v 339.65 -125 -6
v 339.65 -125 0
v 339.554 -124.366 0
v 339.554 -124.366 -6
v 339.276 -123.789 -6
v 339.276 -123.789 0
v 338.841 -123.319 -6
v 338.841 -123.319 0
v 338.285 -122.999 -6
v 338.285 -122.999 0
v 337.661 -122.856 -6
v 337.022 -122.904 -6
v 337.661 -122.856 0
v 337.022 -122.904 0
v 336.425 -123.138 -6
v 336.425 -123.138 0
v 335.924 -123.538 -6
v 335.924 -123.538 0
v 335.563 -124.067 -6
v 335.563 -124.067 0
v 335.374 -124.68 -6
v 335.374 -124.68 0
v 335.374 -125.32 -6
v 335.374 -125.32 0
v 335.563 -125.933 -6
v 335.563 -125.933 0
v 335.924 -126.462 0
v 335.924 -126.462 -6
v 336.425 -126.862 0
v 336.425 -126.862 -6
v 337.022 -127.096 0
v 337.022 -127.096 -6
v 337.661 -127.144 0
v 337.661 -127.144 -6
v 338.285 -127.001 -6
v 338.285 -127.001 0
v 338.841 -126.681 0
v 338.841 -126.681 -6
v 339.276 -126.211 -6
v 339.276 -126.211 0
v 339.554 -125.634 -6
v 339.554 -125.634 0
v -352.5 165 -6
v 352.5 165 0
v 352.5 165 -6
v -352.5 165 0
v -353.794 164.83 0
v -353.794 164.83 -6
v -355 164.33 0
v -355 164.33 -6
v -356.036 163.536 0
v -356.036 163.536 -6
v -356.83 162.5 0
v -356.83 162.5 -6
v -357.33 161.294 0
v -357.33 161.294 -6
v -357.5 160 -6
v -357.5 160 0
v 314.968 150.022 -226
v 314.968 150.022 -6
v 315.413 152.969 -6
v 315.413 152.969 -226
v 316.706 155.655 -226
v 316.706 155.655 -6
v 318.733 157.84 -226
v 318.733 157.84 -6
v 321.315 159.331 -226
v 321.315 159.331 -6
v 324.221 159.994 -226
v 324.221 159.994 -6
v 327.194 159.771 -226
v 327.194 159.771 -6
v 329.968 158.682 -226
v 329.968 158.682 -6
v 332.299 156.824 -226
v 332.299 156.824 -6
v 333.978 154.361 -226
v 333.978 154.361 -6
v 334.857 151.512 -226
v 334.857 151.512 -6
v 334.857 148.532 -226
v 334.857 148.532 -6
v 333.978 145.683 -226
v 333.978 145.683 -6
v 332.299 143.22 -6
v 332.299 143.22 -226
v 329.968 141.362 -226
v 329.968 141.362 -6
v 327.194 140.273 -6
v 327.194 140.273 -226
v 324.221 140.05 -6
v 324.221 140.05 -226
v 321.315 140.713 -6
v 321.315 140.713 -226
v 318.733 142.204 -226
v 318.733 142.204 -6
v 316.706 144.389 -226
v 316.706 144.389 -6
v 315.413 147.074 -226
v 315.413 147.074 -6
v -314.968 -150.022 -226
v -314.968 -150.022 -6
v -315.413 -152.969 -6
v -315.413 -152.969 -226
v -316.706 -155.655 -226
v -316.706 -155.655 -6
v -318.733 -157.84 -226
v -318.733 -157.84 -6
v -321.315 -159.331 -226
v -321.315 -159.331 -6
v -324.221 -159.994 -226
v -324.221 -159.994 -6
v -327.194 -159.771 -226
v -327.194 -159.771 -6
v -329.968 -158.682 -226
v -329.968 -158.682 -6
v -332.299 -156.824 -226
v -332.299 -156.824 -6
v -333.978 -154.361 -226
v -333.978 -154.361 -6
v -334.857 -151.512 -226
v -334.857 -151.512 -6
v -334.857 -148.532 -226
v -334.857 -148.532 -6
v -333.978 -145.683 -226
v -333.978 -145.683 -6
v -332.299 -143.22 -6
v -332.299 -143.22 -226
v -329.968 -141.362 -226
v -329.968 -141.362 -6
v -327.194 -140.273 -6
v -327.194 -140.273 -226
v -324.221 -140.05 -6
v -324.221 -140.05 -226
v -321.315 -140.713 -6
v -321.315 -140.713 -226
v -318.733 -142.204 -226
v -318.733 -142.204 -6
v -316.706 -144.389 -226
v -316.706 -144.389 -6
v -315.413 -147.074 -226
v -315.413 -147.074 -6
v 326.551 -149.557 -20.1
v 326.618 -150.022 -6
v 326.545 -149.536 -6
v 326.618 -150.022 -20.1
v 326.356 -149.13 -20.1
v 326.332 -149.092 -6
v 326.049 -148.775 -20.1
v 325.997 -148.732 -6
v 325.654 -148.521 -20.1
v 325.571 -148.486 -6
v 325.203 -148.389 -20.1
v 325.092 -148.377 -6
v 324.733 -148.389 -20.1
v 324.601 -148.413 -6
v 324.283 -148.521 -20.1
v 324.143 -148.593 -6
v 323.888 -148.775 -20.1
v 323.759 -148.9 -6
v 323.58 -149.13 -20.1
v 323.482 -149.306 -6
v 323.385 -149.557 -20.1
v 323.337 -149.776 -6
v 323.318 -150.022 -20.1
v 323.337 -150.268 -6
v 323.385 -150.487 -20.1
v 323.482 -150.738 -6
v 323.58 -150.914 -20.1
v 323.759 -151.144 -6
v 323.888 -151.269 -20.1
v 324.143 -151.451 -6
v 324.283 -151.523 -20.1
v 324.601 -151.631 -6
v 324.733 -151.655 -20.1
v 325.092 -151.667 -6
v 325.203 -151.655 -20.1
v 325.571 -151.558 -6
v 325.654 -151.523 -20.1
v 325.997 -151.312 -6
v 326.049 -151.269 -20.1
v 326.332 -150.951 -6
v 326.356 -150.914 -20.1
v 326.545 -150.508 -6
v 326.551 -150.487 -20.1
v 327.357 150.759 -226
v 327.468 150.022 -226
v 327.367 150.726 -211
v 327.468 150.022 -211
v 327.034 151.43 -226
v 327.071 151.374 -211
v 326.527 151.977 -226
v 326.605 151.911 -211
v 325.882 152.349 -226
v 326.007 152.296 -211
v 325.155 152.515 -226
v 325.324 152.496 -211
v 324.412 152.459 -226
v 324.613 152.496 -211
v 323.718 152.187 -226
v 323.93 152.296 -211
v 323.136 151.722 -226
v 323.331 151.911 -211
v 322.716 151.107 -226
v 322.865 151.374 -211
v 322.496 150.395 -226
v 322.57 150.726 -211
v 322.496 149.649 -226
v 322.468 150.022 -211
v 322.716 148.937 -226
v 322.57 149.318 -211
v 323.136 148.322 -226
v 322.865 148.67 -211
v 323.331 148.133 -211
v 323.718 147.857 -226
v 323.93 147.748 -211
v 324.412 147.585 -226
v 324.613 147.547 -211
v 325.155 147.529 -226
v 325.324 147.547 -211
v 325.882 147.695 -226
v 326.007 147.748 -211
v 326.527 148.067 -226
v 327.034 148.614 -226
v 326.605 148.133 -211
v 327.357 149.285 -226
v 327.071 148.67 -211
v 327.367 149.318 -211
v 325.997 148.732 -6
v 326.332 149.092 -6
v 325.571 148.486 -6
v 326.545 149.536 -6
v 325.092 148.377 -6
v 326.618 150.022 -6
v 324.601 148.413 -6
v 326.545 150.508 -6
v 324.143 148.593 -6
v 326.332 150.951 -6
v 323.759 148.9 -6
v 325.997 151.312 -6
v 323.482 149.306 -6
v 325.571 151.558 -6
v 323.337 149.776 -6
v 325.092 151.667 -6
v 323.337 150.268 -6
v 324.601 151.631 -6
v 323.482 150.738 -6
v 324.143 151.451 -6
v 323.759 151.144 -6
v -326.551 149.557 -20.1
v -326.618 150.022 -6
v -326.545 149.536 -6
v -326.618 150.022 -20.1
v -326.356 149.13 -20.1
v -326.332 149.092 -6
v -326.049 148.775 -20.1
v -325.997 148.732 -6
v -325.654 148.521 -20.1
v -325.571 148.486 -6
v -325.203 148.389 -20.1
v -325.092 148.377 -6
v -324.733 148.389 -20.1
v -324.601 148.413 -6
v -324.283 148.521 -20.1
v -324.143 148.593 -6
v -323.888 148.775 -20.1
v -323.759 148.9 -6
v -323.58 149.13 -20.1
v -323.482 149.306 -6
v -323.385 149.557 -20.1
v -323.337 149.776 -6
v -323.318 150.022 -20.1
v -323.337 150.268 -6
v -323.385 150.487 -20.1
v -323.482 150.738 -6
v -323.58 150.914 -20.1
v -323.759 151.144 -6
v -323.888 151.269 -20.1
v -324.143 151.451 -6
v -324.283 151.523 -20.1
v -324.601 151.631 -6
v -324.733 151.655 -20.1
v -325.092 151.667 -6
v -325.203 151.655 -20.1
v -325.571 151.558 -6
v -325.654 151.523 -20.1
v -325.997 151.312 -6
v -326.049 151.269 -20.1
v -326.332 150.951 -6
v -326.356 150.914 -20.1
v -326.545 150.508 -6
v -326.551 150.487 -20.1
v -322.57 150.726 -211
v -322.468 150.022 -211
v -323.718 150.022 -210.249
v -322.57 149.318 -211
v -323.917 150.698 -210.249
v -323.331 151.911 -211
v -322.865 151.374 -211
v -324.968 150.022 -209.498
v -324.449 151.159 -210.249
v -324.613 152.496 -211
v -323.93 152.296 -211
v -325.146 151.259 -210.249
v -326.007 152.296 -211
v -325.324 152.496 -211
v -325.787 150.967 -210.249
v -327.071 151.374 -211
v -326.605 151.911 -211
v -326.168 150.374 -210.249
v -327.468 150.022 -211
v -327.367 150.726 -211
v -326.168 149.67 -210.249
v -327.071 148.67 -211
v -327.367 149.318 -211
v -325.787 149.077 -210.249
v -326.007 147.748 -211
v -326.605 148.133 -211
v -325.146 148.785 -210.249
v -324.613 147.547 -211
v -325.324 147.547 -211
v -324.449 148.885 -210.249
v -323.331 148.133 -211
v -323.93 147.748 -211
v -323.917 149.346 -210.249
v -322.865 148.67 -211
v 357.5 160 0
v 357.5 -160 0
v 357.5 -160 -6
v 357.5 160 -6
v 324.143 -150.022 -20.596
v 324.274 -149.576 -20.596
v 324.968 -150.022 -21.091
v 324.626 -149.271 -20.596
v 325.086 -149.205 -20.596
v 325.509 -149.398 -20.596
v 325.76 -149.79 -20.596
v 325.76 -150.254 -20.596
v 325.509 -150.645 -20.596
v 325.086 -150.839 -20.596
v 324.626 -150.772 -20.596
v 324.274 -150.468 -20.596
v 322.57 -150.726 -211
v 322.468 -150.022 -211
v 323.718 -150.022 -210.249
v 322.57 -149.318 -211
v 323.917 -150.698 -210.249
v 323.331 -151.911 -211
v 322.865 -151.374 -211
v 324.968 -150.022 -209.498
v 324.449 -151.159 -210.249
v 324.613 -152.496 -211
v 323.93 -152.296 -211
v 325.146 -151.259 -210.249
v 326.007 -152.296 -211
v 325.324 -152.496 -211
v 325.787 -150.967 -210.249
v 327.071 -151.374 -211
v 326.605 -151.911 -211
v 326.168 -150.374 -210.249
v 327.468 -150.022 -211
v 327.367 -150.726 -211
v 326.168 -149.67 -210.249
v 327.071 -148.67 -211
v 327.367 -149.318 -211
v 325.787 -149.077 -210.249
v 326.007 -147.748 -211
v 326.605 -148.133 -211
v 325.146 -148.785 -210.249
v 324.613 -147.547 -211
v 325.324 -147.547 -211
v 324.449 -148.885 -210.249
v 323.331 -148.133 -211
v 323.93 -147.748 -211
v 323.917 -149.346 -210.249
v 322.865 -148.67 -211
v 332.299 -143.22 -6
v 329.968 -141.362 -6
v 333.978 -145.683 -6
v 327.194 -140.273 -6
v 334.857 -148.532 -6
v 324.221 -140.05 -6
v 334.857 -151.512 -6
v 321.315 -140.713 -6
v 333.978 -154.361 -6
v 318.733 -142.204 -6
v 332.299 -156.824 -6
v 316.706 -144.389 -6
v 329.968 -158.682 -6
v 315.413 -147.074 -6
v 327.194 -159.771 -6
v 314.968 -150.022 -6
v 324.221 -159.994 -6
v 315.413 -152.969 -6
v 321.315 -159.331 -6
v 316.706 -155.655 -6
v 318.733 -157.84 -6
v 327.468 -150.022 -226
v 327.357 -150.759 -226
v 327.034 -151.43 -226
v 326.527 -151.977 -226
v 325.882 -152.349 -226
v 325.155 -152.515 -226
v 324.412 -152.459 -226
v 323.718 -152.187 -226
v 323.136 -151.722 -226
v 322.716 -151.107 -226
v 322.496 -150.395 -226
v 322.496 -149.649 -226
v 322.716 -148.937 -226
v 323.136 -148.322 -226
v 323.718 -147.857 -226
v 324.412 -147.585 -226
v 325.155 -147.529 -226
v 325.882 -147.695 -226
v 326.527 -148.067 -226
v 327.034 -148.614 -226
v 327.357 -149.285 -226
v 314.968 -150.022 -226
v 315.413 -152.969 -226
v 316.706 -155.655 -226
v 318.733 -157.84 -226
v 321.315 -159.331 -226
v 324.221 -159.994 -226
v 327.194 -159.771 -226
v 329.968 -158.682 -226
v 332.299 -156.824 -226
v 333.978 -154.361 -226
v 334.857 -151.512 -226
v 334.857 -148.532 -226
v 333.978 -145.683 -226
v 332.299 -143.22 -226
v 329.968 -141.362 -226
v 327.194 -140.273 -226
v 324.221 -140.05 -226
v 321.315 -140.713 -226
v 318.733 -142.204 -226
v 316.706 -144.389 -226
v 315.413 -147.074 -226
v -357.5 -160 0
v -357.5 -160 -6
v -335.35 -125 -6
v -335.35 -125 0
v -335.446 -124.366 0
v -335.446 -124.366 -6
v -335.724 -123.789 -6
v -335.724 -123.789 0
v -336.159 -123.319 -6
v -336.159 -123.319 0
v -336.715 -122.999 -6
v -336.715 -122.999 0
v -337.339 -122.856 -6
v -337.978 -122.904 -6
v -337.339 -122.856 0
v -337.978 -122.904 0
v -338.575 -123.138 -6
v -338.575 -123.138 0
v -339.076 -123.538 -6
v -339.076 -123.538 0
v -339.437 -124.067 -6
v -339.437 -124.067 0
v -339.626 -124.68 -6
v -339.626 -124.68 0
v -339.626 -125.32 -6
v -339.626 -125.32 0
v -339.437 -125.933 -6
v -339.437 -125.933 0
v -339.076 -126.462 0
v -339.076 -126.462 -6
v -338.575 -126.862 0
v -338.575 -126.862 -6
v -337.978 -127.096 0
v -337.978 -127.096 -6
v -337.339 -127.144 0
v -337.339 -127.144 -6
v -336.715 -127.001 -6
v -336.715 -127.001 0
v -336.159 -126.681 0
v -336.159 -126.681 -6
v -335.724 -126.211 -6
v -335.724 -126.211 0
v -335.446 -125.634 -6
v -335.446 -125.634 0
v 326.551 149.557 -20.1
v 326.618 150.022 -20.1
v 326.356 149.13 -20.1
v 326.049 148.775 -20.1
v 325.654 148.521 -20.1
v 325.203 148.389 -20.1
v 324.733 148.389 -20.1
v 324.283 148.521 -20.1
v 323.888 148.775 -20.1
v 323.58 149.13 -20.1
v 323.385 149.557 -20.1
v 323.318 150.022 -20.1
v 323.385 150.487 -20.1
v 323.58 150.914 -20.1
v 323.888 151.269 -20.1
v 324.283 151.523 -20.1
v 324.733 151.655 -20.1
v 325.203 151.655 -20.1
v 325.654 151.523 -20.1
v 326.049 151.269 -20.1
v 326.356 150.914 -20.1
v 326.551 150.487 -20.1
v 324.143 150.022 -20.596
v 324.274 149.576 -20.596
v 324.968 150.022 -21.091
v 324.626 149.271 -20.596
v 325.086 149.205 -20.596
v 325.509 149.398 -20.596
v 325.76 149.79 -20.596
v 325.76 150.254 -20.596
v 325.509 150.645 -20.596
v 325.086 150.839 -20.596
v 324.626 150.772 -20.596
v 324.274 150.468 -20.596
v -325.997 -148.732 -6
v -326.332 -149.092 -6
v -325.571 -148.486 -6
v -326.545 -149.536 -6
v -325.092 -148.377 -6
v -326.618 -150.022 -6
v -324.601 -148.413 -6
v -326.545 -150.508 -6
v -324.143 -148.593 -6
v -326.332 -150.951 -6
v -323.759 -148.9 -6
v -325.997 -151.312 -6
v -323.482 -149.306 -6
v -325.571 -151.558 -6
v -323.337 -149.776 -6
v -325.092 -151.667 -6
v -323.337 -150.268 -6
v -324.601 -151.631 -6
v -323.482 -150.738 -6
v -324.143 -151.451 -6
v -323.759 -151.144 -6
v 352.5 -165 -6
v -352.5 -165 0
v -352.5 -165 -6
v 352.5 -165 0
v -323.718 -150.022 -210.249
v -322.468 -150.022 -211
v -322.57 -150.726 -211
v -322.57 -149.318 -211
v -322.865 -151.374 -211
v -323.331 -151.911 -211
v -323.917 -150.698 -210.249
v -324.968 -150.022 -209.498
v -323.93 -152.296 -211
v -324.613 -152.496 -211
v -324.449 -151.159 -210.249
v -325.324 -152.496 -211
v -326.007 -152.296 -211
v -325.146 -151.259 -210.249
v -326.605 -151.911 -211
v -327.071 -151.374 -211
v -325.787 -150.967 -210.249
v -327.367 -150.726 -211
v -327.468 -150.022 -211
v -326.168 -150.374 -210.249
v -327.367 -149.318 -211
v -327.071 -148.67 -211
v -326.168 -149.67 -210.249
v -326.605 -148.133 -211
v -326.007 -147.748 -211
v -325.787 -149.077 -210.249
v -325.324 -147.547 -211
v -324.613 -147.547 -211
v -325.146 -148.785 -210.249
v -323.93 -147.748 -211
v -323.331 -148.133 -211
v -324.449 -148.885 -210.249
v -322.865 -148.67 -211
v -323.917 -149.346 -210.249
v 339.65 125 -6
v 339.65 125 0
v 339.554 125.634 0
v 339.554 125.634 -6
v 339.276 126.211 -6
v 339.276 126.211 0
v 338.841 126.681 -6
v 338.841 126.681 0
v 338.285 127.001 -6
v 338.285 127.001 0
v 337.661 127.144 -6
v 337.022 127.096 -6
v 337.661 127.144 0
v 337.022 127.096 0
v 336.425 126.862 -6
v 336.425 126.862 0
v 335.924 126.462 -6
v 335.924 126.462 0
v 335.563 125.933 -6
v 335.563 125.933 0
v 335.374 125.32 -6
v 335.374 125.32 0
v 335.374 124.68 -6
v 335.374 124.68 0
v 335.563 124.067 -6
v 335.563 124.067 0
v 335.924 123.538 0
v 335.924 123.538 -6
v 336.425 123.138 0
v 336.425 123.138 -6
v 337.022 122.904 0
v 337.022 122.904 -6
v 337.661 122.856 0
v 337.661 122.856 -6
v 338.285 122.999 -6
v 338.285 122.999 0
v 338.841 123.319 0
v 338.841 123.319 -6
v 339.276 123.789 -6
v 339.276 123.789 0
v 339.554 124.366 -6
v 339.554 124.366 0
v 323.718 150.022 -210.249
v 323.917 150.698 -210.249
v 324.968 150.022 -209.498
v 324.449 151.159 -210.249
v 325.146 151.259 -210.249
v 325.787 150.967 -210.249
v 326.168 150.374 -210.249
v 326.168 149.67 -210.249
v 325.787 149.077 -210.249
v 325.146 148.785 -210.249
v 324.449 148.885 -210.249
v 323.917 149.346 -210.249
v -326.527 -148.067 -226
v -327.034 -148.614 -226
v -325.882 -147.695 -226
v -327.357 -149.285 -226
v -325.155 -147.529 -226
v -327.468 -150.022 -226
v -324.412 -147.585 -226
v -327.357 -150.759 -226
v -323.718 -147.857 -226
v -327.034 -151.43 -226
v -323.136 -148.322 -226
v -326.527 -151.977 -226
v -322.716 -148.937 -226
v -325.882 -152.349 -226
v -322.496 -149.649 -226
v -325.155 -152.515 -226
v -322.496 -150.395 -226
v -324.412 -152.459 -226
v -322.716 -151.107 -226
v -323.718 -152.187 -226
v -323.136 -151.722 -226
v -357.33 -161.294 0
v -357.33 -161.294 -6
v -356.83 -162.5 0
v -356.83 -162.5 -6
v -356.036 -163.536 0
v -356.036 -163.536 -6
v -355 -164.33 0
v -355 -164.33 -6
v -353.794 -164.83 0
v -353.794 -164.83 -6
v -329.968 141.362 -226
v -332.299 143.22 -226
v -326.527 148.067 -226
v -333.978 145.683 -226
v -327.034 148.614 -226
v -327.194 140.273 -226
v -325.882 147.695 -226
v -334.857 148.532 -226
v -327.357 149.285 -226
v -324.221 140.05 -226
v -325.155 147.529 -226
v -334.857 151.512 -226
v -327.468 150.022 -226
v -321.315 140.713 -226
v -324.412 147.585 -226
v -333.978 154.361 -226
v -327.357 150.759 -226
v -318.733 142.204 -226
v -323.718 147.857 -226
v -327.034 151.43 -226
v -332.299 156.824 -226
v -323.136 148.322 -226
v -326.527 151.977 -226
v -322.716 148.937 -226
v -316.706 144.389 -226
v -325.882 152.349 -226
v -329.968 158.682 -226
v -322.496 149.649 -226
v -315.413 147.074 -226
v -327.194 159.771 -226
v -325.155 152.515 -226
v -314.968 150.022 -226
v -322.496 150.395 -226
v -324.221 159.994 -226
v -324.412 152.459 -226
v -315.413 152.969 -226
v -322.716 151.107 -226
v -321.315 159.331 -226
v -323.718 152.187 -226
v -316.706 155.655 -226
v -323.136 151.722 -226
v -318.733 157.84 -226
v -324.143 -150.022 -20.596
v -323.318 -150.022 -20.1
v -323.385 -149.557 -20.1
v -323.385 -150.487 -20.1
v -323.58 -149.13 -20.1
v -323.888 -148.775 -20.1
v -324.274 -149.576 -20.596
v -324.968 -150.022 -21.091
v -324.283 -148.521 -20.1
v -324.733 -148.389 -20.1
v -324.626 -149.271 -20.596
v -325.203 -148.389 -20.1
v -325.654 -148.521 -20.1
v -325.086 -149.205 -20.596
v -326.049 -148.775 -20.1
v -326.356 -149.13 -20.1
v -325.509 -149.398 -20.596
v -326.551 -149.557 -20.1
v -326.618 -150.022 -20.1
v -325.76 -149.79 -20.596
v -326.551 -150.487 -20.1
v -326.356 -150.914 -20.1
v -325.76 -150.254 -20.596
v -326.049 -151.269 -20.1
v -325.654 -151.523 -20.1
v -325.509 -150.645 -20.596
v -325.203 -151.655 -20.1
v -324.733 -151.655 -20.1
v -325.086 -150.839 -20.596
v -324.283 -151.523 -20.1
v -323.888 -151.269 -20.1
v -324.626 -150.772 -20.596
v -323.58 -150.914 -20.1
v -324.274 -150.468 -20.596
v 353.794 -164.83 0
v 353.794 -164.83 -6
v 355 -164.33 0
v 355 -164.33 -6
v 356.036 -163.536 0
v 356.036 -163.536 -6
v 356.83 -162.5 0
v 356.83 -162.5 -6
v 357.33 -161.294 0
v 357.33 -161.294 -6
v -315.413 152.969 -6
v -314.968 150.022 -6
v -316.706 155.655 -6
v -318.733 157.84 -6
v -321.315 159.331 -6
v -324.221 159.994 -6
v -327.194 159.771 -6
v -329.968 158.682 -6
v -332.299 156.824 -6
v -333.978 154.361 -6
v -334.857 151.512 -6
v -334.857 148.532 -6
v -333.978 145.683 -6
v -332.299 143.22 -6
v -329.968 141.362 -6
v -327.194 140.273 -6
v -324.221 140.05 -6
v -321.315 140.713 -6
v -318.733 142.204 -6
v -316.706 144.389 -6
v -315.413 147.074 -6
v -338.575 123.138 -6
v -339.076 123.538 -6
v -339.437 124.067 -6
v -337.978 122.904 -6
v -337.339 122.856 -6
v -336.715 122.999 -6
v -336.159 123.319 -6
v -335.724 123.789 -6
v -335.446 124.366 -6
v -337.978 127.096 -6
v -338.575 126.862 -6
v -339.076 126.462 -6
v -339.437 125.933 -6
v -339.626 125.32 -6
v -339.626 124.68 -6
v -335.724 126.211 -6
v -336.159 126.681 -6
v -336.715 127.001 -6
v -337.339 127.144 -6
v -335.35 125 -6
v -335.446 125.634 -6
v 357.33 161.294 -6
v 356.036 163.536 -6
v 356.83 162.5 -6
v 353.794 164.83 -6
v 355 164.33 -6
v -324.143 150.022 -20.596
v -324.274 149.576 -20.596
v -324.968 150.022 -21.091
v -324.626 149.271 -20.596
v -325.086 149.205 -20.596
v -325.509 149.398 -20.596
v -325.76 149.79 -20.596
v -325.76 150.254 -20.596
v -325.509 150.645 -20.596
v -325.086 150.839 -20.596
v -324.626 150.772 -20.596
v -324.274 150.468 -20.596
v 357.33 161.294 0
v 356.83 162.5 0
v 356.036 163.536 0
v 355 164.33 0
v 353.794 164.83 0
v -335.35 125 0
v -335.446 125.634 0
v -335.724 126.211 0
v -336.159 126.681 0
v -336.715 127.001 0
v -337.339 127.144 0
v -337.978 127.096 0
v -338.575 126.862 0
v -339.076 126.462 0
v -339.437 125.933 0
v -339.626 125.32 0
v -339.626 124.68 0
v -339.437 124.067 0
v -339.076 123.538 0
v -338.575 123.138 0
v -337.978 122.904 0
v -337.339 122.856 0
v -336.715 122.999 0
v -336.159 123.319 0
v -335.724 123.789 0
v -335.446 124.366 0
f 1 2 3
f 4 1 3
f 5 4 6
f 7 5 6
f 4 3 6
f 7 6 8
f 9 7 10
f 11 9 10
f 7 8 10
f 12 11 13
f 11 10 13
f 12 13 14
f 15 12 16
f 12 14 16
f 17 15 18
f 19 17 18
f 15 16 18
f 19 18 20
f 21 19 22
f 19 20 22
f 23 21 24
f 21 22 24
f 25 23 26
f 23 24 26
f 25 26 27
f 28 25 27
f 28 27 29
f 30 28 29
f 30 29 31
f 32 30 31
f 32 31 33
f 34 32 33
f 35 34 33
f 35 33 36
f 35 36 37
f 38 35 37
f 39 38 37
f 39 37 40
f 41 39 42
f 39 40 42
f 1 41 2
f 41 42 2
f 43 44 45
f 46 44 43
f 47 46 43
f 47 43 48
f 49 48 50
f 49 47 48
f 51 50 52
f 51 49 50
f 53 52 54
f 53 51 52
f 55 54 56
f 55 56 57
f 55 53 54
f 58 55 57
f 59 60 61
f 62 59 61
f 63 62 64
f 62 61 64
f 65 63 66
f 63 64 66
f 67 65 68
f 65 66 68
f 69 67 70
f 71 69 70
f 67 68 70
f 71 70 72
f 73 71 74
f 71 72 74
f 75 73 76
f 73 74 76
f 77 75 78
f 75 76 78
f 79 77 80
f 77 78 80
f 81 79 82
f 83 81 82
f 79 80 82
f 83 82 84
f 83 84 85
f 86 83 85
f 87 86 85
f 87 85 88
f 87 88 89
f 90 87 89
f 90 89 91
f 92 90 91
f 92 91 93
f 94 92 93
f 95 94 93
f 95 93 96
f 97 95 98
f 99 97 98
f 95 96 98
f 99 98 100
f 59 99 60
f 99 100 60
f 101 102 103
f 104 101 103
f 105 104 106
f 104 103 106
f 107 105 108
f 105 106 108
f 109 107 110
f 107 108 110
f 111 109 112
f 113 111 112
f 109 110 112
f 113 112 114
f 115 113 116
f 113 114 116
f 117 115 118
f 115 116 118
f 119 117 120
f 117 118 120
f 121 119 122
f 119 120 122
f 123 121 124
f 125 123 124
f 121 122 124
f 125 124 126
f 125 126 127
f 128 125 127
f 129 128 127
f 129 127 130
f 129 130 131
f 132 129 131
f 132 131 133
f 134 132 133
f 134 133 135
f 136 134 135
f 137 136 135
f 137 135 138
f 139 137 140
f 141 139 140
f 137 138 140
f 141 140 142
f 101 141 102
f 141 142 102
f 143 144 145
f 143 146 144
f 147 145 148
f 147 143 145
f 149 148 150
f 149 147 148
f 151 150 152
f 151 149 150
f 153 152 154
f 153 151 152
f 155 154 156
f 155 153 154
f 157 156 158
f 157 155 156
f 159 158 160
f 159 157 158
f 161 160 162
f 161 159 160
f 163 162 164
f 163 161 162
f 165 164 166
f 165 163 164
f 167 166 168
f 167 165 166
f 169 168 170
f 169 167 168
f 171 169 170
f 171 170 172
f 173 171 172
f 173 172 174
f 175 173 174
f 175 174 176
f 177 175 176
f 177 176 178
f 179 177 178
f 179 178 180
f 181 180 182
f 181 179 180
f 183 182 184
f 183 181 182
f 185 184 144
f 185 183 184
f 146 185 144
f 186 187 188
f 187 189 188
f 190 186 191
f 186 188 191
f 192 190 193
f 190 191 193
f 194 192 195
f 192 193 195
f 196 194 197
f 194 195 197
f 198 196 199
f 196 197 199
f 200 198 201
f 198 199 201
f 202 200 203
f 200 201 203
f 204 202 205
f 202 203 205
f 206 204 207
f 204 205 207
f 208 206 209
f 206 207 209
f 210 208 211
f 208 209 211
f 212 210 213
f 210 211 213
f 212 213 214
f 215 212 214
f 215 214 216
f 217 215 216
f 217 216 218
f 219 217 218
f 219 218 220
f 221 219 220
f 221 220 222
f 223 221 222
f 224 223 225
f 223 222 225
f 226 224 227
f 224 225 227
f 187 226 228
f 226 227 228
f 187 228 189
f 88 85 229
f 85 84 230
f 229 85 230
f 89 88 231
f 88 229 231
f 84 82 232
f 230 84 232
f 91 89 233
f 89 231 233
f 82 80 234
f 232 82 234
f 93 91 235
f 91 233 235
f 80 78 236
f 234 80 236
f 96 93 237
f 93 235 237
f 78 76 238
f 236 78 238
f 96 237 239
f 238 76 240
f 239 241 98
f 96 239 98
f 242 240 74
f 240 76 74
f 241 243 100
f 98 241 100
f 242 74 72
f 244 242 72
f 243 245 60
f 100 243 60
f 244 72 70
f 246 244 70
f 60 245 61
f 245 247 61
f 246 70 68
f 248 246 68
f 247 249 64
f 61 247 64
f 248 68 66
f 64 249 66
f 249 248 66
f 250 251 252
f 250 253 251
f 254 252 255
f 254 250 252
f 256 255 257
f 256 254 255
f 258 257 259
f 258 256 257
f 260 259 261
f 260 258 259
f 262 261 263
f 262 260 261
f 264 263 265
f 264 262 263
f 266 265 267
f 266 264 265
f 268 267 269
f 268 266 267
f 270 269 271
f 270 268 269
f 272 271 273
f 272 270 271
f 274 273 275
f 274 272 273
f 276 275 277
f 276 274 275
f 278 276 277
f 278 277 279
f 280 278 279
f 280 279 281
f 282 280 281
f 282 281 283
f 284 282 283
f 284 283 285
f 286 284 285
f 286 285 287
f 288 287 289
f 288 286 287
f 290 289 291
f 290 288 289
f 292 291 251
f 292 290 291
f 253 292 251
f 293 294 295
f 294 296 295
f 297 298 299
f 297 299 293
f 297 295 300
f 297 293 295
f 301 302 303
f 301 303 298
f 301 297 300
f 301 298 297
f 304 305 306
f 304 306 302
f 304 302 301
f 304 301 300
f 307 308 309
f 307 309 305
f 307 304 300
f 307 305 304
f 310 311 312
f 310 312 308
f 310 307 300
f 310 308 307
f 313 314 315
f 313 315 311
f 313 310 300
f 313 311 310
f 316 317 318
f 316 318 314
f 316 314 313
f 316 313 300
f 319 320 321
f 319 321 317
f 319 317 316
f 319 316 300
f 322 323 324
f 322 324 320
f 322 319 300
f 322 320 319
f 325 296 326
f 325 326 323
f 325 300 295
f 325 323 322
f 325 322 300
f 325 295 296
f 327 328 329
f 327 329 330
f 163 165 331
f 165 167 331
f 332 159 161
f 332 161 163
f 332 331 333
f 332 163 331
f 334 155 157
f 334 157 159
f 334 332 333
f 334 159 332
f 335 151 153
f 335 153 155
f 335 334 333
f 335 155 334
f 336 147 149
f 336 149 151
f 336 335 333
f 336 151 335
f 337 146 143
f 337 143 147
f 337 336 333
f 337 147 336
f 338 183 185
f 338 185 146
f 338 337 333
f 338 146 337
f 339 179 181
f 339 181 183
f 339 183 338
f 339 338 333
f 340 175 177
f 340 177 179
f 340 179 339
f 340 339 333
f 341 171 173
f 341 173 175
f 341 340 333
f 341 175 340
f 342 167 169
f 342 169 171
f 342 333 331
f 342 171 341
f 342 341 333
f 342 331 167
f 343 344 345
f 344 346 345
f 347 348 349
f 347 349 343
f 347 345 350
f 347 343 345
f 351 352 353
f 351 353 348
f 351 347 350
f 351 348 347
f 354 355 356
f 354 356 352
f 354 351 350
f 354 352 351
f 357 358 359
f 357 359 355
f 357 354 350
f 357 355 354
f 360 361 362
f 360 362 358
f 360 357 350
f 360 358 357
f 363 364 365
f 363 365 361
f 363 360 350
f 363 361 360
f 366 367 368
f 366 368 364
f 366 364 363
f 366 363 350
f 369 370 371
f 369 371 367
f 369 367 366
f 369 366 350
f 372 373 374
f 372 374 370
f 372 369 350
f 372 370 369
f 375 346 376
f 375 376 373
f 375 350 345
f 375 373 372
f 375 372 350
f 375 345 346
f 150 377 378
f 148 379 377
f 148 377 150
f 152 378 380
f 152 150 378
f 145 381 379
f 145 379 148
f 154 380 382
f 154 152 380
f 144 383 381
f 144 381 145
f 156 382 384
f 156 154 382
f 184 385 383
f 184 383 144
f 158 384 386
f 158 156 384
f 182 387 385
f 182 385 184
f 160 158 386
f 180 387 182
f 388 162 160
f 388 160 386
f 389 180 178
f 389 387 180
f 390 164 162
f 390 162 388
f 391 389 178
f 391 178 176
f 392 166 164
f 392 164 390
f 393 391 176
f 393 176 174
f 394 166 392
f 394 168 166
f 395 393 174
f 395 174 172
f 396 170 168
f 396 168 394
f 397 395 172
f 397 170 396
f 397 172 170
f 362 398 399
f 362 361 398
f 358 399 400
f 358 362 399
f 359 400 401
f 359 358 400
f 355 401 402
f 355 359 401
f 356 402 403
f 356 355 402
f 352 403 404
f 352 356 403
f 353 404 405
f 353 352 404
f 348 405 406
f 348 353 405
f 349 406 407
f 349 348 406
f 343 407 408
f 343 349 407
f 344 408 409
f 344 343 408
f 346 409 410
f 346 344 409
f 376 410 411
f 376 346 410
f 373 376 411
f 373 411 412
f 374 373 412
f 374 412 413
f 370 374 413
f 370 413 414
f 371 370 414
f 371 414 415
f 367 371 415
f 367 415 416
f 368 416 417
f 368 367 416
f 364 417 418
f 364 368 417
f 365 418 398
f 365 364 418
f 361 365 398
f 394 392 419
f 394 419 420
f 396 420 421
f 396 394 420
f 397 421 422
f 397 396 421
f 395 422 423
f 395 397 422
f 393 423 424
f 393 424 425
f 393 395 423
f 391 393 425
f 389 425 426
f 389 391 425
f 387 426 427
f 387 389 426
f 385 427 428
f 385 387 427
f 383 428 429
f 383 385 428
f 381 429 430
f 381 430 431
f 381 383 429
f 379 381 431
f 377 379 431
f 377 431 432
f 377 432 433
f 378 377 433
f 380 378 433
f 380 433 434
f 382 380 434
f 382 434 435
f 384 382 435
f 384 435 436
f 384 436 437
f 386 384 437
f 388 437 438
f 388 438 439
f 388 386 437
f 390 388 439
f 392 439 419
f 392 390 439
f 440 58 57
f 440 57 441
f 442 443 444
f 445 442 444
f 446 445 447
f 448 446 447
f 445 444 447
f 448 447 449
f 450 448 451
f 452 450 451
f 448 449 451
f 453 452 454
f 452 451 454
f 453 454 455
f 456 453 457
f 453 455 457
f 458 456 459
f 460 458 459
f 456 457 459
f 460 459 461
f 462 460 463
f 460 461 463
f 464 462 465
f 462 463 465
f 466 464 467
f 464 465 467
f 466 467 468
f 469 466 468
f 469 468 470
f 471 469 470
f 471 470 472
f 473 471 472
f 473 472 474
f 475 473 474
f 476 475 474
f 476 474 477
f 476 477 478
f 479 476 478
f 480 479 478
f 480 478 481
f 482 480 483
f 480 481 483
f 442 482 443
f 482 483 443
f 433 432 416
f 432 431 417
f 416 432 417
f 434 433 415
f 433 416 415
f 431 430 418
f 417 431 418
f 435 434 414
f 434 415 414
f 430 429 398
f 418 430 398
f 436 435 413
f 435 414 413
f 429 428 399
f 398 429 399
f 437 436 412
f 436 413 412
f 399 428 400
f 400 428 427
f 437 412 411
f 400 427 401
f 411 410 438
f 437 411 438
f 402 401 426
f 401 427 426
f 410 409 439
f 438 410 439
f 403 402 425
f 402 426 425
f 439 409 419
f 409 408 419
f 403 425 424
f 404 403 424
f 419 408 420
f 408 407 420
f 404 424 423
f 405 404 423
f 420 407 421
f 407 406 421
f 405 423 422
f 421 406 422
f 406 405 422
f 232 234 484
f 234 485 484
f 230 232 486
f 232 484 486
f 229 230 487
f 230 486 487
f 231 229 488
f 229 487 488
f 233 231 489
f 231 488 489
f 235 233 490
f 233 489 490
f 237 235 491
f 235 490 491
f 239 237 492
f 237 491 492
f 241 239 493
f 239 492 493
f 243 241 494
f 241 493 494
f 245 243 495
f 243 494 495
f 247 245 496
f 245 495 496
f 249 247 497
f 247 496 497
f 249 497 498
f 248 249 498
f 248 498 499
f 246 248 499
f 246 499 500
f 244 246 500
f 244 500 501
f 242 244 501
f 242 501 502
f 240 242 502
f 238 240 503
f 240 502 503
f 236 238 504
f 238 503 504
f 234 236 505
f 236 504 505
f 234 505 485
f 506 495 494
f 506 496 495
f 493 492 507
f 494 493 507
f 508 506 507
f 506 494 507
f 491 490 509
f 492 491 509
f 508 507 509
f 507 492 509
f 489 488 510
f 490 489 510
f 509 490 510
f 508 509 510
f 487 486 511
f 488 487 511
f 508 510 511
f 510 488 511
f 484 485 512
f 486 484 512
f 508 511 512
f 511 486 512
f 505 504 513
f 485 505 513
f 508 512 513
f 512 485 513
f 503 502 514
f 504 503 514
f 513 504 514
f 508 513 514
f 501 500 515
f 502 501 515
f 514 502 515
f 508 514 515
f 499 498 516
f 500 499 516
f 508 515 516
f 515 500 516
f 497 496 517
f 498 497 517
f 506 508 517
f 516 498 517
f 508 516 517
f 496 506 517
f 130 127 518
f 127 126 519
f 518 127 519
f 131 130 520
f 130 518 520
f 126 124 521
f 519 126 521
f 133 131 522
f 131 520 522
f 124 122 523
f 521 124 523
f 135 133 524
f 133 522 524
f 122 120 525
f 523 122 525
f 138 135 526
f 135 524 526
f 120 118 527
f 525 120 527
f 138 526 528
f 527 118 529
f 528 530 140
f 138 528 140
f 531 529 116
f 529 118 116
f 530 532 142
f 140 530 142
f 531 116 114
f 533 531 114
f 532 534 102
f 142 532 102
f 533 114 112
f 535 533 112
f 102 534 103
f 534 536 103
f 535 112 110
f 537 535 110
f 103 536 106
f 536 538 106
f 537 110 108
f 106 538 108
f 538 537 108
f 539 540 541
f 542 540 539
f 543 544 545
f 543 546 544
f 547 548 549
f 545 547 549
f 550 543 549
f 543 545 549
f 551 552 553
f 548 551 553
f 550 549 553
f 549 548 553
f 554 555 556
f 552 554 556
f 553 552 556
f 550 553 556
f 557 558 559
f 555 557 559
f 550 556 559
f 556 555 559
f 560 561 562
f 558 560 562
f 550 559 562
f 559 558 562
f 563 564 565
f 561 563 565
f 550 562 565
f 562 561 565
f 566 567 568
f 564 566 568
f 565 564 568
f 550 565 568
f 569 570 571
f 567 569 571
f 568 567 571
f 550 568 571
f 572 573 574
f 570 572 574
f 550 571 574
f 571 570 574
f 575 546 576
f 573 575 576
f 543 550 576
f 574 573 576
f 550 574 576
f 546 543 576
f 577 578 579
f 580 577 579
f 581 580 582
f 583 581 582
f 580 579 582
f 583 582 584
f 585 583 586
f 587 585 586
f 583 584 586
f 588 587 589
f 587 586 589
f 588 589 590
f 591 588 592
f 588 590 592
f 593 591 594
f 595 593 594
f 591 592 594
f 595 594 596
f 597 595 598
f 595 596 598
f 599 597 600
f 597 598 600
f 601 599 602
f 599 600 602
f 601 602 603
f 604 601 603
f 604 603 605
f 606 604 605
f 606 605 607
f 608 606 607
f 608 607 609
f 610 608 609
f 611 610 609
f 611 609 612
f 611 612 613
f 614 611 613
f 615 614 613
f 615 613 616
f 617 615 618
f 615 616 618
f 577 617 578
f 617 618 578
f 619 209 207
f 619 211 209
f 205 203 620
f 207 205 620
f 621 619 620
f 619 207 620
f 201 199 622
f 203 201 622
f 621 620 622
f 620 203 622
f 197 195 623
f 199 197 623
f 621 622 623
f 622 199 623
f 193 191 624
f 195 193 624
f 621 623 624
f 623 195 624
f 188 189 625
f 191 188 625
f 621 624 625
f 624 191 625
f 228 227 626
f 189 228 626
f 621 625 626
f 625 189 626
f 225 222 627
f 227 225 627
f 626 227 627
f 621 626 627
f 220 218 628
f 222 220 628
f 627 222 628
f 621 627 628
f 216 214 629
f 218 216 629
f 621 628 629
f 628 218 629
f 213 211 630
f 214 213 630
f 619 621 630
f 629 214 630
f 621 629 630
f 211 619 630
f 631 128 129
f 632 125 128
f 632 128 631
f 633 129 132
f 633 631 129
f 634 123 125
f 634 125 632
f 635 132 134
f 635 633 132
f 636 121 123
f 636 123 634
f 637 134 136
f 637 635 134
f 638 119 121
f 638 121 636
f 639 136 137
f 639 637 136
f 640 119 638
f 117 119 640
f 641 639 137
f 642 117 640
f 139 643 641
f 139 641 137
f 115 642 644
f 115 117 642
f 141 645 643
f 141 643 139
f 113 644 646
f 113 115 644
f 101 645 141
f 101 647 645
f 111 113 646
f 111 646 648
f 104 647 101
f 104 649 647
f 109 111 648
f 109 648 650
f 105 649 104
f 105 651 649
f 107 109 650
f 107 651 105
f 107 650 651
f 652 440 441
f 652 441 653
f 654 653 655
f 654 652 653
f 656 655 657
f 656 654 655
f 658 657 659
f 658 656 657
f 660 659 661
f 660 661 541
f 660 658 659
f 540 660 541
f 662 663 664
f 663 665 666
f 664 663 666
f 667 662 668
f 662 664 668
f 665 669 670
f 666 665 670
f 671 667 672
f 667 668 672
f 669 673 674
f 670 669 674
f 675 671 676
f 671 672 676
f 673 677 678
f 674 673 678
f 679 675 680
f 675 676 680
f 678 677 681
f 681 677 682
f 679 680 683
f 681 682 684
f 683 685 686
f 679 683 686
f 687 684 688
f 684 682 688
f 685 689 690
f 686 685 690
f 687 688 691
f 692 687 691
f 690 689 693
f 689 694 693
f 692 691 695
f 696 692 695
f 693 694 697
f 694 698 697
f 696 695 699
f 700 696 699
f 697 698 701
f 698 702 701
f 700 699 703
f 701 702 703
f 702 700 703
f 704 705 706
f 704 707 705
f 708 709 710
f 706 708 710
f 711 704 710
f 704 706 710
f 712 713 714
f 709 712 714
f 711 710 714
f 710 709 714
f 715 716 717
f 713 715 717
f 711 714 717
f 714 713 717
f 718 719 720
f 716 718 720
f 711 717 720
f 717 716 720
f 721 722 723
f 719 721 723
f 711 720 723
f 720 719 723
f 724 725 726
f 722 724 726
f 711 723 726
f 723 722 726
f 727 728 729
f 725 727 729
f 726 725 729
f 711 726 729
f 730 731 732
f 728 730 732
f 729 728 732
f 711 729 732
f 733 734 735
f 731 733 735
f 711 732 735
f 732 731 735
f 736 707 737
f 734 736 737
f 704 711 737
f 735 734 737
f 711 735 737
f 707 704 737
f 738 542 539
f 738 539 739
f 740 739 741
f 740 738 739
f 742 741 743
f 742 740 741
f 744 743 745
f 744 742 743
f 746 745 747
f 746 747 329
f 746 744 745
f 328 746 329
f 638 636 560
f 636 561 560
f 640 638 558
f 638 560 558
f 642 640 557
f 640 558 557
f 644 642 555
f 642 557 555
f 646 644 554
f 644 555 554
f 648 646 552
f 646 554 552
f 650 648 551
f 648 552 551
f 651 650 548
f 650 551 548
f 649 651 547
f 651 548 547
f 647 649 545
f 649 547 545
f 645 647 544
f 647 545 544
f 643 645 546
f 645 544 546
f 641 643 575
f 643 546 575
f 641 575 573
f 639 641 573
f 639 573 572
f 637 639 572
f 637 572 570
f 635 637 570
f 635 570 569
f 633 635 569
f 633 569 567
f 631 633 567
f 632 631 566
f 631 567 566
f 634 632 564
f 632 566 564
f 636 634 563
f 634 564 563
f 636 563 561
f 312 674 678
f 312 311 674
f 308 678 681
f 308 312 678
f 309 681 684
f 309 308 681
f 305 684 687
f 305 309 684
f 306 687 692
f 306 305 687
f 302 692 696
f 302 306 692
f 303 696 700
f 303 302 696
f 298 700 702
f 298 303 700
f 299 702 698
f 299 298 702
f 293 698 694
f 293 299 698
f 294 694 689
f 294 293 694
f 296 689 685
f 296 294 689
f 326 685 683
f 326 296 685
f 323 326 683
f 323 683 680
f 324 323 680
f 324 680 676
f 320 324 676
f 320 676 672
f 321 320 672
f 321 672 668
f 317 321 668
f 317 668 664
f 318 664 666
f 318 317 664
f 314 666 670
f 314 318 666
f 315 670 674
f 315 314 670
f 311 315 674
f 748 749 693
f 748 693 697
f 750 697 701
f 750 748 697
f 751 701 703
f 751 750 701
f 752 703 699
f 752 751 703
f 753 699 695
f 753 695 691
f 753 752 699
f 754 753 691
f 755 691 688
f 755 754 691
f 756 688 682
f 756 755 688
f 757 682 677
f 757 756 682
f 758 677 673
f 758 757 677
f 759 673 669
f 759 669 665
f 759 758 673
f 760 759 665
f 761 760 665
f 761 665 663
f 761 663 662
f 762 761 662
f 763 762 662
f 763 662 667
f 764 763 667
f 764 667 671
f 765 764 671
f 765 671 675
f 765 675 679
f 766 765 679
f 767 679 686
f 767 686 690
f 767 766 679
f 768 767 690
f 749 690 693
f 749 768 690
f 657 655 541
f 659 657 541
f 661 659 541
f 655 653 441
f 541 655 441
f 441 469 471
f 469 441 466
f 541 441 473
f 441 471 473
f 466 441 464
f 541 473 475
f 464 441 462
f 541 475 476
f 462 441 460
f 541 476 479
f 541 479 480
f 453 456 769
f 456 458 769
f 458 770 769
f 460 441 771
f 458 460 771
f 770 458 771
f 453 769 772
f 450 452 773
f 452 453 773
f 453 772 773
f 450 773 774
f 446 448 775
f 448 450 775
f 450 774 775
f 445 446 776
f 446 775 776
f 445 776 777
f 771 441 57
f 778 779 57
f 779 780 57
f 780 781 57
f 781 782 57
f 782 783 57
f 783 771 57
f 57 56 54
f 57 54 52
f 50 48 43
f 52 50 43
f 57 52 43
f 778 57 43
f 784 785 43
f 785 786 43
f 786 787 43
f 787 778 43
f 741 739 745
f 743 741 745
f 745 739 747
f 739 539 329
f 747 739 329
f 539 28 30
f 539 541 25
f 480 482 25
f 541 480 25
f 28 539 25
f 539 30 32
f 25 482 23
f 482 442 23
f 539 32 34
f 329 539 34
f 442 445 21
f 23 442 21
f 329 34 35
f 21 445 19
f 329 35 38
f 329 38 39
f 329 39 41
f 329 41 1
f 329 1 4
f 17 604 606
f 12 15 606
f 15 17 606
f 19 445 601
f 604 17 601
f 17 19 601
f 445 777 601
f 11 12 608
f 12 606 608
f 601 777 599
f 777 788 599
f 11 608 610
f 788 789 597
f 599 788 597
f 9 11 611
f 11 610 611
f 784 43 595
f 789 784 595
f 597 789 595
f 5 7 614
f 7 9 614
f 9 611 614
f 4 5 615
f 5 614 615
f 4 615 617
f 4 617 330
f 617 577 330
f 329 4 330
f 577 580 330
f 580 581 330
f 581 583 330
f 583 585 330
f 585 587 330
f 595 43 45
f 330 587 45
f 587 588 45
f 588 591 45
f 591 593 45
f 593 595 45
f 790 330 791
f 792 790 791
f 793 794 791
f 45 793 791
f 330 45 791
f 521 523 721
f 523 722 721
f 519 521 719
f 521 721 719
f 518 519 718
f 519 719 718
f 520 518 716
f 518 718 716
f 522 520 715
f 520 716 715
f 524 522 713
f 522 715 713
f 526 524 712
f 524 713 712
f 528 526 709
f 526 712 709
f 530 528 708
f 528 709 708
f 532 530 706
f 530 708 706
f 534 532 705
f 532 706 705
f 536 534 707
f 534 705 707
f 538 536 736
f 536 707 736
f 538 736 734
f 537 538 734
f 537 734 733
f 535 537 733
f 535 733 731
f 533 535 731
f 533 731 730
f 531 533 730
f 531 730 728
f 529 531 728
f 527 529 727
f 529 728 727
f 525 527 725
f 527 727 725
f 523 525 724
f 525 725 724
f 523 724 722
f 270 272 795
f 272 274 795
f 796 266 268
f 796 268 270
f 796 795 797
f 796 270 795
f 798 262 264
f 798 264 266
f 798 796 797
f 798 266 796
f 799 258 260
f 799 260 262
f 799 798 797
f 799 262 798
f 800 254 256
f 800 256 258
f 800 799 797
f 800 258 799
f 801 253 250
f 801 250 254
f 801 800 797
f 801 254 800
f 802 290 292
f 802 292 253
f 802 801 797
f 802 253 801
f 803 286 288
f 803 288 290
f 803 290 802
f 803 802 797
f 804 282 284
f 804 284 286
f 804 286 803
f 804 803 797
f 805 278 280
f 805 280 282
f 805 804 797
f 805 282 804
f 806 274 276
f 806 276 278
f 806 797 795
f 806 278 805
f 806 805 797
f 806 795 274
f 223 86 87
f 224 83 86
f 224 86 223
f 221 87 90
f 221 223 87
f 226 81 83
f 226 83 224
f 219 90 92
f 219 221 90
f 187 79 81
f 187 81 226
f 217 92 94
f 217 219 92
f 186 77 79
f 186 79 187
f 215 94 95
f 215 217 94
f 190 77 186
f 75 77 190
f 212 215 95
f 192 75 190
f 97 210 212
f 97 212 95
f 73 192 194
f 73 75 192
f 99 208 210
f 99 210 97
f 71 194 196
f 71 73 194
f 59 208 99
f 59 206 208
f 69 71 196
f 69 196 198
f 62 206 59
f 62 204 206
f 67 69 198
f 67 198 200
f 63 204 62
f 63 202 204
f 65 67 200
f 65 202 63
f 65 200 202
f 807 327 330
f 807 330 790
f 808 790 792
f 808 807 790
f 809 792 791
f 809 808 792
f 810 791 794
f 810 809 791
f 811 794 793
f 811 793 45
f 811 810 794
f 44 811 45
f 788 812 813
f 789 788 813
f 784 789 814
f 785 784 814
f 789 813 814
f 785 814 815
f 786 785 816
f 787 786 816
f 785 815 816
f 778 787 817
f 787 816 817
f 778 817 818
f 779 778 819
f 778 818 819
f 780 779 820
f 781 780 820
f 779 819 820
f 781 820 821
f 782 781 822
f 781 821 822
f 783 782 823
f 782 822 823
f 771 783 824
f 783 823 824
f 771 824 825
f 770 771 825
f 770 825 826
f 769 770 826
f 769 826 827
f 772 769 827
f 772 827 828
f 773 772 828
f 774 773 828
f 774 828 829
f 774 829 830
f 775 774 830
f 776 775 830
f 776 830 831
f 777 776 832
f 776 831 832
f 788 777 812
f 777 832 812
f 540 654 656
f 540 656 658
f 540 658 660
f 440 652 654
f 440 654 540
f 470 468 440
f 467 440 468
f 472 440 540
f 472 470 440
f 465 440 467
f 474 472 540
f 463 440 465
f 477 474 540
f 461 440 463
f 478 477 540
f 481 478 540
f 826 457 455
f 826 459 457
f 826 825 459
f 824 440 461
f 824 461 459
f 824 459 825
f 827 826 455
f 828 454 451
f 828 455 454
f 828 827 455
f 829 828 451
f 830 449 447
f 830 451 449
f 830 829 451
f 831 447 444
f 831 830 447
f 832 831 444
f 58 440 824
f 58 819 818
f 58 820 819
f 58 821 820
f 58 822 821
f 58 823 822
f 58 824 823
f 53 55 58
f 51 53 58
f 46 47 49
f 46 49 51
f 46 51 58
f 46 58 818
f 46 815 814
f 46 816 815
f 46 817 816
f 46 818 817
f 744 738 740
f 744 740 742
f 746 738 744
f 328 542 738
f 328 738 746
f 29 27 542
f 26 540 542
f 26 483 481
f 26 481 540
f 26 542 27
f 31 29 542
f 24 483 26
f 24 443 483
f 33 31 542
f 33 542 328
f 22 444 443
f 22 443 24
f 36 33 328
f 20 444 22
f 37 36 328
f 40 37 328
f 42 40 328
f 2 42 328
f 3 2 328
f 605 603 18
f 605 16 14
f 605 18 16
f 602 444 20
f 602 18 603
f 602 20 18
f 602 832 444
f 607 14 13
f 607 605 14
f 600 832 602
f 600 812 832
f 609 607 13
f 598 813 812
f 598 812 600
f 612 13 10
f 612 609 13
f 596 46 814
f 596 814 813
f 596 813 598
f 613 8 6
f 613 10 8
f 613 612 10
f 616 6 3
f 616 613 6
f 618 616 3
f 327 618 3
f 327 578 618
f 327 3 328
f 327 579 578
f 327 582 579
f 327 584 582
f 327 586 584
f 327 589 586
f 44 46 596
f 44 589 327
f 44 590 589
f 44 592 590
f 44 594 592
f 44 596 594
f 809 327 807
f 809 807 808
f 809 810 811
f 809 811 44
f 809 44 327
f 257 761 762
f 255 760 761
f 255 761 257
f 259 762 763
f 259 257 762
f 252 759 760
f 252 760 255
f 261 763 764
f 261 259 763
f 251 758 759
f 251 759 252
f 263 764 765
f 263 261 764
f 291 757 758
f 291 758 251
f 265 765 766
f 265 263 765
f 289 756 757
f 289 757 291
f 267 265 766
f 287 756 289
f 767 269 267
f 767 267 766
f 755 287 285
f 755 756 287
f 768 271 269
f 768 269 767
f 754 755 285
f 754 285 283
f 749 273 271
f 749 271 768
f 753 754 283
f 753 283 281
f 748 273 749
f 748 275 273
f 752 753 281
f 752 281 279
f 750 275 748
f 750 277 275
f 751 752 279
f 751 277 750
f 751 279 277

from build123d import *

# Parameters (mm, degrees)
F0_R     = 2.15
F1_DEPTH = 6
F2_R     = 10
F3_DEPTH = 220
F5_D     = 5
F5_DEPTH = 15
F5_TIP   = 1.5021515476
F6_D     = 3.3
F6_DEPTH = 14.1
F6_TIP   = 0.9914200214


with BuildPart() as f1:
    # F0 (on Top) → F1 (new body)
    with BuildSketch(Plane.XY):
        with BuildLine():
            ThreePointArc((357.5, 160), (356.0355339059, 163.5355339059), (352.5, 165))
            Line((352.5, 165), (-352.5, 165))
            ThreePointArc((-352.5, 165), (-356.0355339059, 163.5355339059), (-357.5, 160))
            Line((-357.5, 160), (-357.5, -160))
            ThreePointArc((-357.5, -160), (-356.0355339059, -163.5355339059), (-352.5, -165))
            Line((-352.5, -165), (352.5, -165))
            ThreePointArc((352.5, -165), (356.0355339059, -163.5355339059), (357.5, -160))
            Line((357.5, -160), (357.5, 160))
        make_face()
        with Locations((-337.5, -125)):
            Circle(F0_R, mode=Mode.SUBTRACT)
        with Locations((337.5, -125)):
            Circle(F0_R, mode=Mode.SUBTRACT)
        with Locations((-337.5, 125)):
            Circle(F0_R, mode=Mode.SUBTRACT)
        with Locations((337.5, 125)):
            Circle(F0_R, mode=Mode.SUBTRACT)
    extrude(amount=-F1_DEPTH)


with BuildPart() as f3:
    # F2 (on face) → F3 (new body)
    with BuildSketch(Plane(origin=(0, 0, -6), x_dir=(1, 0, 0), z_dir=(0, 0, -1))):
        with Locations((-324.9683082104, 150.0219404697)):
            Circle(F2_R)
    extrude(amount=F3_DEPTH)

    # F5
    with Locations(Plane(origin=(0, 0, -226), x_dir=(1, 0, 0), z_dir=(0, 0, -1))):
        with Locations((-324.9683082104, 150.0219404697)):
            Hole(F5_D / 2, depth=F5_DEPTH)
            with Locations((0, 0, -(F5_DEPTH + F5_TIP / 2))):  # 118° drill point
                Cone(0, F5_D / 2, F5_TIP, mode=Mode.SUBTRACT)

    # F6
    with Locations(Plane.XY.offset(-6)):
        with Locations((-324.9683082104, -150.0219404697)):
            Hole(F6_D / 2, depth=F6_DEPTH)
            with Locations((0, 0, -(F6_DEPTH + F6_TIP / 2))):  # 118° drill point
                Cone(0, F6_D / 2, F6_TIP, mode=Mode.SUBTRACT)


with BuildPart() as f7_1:
    # F7: instance of F3
    add(f3.part.mirror(Plane.YZ))


with BuildPart() as f8_1:
    # F8: instance of F3
    add(f3.part.mirror(Plane.XZ))


with BuildPart() as f8_2:
    # F8: instance of F7_1
    add(f7_1.part.mirror(Plane.XZ))


solid = Compound([f1.part, f3.part, f7_1.part, f8_1.part, f8_2.part])
